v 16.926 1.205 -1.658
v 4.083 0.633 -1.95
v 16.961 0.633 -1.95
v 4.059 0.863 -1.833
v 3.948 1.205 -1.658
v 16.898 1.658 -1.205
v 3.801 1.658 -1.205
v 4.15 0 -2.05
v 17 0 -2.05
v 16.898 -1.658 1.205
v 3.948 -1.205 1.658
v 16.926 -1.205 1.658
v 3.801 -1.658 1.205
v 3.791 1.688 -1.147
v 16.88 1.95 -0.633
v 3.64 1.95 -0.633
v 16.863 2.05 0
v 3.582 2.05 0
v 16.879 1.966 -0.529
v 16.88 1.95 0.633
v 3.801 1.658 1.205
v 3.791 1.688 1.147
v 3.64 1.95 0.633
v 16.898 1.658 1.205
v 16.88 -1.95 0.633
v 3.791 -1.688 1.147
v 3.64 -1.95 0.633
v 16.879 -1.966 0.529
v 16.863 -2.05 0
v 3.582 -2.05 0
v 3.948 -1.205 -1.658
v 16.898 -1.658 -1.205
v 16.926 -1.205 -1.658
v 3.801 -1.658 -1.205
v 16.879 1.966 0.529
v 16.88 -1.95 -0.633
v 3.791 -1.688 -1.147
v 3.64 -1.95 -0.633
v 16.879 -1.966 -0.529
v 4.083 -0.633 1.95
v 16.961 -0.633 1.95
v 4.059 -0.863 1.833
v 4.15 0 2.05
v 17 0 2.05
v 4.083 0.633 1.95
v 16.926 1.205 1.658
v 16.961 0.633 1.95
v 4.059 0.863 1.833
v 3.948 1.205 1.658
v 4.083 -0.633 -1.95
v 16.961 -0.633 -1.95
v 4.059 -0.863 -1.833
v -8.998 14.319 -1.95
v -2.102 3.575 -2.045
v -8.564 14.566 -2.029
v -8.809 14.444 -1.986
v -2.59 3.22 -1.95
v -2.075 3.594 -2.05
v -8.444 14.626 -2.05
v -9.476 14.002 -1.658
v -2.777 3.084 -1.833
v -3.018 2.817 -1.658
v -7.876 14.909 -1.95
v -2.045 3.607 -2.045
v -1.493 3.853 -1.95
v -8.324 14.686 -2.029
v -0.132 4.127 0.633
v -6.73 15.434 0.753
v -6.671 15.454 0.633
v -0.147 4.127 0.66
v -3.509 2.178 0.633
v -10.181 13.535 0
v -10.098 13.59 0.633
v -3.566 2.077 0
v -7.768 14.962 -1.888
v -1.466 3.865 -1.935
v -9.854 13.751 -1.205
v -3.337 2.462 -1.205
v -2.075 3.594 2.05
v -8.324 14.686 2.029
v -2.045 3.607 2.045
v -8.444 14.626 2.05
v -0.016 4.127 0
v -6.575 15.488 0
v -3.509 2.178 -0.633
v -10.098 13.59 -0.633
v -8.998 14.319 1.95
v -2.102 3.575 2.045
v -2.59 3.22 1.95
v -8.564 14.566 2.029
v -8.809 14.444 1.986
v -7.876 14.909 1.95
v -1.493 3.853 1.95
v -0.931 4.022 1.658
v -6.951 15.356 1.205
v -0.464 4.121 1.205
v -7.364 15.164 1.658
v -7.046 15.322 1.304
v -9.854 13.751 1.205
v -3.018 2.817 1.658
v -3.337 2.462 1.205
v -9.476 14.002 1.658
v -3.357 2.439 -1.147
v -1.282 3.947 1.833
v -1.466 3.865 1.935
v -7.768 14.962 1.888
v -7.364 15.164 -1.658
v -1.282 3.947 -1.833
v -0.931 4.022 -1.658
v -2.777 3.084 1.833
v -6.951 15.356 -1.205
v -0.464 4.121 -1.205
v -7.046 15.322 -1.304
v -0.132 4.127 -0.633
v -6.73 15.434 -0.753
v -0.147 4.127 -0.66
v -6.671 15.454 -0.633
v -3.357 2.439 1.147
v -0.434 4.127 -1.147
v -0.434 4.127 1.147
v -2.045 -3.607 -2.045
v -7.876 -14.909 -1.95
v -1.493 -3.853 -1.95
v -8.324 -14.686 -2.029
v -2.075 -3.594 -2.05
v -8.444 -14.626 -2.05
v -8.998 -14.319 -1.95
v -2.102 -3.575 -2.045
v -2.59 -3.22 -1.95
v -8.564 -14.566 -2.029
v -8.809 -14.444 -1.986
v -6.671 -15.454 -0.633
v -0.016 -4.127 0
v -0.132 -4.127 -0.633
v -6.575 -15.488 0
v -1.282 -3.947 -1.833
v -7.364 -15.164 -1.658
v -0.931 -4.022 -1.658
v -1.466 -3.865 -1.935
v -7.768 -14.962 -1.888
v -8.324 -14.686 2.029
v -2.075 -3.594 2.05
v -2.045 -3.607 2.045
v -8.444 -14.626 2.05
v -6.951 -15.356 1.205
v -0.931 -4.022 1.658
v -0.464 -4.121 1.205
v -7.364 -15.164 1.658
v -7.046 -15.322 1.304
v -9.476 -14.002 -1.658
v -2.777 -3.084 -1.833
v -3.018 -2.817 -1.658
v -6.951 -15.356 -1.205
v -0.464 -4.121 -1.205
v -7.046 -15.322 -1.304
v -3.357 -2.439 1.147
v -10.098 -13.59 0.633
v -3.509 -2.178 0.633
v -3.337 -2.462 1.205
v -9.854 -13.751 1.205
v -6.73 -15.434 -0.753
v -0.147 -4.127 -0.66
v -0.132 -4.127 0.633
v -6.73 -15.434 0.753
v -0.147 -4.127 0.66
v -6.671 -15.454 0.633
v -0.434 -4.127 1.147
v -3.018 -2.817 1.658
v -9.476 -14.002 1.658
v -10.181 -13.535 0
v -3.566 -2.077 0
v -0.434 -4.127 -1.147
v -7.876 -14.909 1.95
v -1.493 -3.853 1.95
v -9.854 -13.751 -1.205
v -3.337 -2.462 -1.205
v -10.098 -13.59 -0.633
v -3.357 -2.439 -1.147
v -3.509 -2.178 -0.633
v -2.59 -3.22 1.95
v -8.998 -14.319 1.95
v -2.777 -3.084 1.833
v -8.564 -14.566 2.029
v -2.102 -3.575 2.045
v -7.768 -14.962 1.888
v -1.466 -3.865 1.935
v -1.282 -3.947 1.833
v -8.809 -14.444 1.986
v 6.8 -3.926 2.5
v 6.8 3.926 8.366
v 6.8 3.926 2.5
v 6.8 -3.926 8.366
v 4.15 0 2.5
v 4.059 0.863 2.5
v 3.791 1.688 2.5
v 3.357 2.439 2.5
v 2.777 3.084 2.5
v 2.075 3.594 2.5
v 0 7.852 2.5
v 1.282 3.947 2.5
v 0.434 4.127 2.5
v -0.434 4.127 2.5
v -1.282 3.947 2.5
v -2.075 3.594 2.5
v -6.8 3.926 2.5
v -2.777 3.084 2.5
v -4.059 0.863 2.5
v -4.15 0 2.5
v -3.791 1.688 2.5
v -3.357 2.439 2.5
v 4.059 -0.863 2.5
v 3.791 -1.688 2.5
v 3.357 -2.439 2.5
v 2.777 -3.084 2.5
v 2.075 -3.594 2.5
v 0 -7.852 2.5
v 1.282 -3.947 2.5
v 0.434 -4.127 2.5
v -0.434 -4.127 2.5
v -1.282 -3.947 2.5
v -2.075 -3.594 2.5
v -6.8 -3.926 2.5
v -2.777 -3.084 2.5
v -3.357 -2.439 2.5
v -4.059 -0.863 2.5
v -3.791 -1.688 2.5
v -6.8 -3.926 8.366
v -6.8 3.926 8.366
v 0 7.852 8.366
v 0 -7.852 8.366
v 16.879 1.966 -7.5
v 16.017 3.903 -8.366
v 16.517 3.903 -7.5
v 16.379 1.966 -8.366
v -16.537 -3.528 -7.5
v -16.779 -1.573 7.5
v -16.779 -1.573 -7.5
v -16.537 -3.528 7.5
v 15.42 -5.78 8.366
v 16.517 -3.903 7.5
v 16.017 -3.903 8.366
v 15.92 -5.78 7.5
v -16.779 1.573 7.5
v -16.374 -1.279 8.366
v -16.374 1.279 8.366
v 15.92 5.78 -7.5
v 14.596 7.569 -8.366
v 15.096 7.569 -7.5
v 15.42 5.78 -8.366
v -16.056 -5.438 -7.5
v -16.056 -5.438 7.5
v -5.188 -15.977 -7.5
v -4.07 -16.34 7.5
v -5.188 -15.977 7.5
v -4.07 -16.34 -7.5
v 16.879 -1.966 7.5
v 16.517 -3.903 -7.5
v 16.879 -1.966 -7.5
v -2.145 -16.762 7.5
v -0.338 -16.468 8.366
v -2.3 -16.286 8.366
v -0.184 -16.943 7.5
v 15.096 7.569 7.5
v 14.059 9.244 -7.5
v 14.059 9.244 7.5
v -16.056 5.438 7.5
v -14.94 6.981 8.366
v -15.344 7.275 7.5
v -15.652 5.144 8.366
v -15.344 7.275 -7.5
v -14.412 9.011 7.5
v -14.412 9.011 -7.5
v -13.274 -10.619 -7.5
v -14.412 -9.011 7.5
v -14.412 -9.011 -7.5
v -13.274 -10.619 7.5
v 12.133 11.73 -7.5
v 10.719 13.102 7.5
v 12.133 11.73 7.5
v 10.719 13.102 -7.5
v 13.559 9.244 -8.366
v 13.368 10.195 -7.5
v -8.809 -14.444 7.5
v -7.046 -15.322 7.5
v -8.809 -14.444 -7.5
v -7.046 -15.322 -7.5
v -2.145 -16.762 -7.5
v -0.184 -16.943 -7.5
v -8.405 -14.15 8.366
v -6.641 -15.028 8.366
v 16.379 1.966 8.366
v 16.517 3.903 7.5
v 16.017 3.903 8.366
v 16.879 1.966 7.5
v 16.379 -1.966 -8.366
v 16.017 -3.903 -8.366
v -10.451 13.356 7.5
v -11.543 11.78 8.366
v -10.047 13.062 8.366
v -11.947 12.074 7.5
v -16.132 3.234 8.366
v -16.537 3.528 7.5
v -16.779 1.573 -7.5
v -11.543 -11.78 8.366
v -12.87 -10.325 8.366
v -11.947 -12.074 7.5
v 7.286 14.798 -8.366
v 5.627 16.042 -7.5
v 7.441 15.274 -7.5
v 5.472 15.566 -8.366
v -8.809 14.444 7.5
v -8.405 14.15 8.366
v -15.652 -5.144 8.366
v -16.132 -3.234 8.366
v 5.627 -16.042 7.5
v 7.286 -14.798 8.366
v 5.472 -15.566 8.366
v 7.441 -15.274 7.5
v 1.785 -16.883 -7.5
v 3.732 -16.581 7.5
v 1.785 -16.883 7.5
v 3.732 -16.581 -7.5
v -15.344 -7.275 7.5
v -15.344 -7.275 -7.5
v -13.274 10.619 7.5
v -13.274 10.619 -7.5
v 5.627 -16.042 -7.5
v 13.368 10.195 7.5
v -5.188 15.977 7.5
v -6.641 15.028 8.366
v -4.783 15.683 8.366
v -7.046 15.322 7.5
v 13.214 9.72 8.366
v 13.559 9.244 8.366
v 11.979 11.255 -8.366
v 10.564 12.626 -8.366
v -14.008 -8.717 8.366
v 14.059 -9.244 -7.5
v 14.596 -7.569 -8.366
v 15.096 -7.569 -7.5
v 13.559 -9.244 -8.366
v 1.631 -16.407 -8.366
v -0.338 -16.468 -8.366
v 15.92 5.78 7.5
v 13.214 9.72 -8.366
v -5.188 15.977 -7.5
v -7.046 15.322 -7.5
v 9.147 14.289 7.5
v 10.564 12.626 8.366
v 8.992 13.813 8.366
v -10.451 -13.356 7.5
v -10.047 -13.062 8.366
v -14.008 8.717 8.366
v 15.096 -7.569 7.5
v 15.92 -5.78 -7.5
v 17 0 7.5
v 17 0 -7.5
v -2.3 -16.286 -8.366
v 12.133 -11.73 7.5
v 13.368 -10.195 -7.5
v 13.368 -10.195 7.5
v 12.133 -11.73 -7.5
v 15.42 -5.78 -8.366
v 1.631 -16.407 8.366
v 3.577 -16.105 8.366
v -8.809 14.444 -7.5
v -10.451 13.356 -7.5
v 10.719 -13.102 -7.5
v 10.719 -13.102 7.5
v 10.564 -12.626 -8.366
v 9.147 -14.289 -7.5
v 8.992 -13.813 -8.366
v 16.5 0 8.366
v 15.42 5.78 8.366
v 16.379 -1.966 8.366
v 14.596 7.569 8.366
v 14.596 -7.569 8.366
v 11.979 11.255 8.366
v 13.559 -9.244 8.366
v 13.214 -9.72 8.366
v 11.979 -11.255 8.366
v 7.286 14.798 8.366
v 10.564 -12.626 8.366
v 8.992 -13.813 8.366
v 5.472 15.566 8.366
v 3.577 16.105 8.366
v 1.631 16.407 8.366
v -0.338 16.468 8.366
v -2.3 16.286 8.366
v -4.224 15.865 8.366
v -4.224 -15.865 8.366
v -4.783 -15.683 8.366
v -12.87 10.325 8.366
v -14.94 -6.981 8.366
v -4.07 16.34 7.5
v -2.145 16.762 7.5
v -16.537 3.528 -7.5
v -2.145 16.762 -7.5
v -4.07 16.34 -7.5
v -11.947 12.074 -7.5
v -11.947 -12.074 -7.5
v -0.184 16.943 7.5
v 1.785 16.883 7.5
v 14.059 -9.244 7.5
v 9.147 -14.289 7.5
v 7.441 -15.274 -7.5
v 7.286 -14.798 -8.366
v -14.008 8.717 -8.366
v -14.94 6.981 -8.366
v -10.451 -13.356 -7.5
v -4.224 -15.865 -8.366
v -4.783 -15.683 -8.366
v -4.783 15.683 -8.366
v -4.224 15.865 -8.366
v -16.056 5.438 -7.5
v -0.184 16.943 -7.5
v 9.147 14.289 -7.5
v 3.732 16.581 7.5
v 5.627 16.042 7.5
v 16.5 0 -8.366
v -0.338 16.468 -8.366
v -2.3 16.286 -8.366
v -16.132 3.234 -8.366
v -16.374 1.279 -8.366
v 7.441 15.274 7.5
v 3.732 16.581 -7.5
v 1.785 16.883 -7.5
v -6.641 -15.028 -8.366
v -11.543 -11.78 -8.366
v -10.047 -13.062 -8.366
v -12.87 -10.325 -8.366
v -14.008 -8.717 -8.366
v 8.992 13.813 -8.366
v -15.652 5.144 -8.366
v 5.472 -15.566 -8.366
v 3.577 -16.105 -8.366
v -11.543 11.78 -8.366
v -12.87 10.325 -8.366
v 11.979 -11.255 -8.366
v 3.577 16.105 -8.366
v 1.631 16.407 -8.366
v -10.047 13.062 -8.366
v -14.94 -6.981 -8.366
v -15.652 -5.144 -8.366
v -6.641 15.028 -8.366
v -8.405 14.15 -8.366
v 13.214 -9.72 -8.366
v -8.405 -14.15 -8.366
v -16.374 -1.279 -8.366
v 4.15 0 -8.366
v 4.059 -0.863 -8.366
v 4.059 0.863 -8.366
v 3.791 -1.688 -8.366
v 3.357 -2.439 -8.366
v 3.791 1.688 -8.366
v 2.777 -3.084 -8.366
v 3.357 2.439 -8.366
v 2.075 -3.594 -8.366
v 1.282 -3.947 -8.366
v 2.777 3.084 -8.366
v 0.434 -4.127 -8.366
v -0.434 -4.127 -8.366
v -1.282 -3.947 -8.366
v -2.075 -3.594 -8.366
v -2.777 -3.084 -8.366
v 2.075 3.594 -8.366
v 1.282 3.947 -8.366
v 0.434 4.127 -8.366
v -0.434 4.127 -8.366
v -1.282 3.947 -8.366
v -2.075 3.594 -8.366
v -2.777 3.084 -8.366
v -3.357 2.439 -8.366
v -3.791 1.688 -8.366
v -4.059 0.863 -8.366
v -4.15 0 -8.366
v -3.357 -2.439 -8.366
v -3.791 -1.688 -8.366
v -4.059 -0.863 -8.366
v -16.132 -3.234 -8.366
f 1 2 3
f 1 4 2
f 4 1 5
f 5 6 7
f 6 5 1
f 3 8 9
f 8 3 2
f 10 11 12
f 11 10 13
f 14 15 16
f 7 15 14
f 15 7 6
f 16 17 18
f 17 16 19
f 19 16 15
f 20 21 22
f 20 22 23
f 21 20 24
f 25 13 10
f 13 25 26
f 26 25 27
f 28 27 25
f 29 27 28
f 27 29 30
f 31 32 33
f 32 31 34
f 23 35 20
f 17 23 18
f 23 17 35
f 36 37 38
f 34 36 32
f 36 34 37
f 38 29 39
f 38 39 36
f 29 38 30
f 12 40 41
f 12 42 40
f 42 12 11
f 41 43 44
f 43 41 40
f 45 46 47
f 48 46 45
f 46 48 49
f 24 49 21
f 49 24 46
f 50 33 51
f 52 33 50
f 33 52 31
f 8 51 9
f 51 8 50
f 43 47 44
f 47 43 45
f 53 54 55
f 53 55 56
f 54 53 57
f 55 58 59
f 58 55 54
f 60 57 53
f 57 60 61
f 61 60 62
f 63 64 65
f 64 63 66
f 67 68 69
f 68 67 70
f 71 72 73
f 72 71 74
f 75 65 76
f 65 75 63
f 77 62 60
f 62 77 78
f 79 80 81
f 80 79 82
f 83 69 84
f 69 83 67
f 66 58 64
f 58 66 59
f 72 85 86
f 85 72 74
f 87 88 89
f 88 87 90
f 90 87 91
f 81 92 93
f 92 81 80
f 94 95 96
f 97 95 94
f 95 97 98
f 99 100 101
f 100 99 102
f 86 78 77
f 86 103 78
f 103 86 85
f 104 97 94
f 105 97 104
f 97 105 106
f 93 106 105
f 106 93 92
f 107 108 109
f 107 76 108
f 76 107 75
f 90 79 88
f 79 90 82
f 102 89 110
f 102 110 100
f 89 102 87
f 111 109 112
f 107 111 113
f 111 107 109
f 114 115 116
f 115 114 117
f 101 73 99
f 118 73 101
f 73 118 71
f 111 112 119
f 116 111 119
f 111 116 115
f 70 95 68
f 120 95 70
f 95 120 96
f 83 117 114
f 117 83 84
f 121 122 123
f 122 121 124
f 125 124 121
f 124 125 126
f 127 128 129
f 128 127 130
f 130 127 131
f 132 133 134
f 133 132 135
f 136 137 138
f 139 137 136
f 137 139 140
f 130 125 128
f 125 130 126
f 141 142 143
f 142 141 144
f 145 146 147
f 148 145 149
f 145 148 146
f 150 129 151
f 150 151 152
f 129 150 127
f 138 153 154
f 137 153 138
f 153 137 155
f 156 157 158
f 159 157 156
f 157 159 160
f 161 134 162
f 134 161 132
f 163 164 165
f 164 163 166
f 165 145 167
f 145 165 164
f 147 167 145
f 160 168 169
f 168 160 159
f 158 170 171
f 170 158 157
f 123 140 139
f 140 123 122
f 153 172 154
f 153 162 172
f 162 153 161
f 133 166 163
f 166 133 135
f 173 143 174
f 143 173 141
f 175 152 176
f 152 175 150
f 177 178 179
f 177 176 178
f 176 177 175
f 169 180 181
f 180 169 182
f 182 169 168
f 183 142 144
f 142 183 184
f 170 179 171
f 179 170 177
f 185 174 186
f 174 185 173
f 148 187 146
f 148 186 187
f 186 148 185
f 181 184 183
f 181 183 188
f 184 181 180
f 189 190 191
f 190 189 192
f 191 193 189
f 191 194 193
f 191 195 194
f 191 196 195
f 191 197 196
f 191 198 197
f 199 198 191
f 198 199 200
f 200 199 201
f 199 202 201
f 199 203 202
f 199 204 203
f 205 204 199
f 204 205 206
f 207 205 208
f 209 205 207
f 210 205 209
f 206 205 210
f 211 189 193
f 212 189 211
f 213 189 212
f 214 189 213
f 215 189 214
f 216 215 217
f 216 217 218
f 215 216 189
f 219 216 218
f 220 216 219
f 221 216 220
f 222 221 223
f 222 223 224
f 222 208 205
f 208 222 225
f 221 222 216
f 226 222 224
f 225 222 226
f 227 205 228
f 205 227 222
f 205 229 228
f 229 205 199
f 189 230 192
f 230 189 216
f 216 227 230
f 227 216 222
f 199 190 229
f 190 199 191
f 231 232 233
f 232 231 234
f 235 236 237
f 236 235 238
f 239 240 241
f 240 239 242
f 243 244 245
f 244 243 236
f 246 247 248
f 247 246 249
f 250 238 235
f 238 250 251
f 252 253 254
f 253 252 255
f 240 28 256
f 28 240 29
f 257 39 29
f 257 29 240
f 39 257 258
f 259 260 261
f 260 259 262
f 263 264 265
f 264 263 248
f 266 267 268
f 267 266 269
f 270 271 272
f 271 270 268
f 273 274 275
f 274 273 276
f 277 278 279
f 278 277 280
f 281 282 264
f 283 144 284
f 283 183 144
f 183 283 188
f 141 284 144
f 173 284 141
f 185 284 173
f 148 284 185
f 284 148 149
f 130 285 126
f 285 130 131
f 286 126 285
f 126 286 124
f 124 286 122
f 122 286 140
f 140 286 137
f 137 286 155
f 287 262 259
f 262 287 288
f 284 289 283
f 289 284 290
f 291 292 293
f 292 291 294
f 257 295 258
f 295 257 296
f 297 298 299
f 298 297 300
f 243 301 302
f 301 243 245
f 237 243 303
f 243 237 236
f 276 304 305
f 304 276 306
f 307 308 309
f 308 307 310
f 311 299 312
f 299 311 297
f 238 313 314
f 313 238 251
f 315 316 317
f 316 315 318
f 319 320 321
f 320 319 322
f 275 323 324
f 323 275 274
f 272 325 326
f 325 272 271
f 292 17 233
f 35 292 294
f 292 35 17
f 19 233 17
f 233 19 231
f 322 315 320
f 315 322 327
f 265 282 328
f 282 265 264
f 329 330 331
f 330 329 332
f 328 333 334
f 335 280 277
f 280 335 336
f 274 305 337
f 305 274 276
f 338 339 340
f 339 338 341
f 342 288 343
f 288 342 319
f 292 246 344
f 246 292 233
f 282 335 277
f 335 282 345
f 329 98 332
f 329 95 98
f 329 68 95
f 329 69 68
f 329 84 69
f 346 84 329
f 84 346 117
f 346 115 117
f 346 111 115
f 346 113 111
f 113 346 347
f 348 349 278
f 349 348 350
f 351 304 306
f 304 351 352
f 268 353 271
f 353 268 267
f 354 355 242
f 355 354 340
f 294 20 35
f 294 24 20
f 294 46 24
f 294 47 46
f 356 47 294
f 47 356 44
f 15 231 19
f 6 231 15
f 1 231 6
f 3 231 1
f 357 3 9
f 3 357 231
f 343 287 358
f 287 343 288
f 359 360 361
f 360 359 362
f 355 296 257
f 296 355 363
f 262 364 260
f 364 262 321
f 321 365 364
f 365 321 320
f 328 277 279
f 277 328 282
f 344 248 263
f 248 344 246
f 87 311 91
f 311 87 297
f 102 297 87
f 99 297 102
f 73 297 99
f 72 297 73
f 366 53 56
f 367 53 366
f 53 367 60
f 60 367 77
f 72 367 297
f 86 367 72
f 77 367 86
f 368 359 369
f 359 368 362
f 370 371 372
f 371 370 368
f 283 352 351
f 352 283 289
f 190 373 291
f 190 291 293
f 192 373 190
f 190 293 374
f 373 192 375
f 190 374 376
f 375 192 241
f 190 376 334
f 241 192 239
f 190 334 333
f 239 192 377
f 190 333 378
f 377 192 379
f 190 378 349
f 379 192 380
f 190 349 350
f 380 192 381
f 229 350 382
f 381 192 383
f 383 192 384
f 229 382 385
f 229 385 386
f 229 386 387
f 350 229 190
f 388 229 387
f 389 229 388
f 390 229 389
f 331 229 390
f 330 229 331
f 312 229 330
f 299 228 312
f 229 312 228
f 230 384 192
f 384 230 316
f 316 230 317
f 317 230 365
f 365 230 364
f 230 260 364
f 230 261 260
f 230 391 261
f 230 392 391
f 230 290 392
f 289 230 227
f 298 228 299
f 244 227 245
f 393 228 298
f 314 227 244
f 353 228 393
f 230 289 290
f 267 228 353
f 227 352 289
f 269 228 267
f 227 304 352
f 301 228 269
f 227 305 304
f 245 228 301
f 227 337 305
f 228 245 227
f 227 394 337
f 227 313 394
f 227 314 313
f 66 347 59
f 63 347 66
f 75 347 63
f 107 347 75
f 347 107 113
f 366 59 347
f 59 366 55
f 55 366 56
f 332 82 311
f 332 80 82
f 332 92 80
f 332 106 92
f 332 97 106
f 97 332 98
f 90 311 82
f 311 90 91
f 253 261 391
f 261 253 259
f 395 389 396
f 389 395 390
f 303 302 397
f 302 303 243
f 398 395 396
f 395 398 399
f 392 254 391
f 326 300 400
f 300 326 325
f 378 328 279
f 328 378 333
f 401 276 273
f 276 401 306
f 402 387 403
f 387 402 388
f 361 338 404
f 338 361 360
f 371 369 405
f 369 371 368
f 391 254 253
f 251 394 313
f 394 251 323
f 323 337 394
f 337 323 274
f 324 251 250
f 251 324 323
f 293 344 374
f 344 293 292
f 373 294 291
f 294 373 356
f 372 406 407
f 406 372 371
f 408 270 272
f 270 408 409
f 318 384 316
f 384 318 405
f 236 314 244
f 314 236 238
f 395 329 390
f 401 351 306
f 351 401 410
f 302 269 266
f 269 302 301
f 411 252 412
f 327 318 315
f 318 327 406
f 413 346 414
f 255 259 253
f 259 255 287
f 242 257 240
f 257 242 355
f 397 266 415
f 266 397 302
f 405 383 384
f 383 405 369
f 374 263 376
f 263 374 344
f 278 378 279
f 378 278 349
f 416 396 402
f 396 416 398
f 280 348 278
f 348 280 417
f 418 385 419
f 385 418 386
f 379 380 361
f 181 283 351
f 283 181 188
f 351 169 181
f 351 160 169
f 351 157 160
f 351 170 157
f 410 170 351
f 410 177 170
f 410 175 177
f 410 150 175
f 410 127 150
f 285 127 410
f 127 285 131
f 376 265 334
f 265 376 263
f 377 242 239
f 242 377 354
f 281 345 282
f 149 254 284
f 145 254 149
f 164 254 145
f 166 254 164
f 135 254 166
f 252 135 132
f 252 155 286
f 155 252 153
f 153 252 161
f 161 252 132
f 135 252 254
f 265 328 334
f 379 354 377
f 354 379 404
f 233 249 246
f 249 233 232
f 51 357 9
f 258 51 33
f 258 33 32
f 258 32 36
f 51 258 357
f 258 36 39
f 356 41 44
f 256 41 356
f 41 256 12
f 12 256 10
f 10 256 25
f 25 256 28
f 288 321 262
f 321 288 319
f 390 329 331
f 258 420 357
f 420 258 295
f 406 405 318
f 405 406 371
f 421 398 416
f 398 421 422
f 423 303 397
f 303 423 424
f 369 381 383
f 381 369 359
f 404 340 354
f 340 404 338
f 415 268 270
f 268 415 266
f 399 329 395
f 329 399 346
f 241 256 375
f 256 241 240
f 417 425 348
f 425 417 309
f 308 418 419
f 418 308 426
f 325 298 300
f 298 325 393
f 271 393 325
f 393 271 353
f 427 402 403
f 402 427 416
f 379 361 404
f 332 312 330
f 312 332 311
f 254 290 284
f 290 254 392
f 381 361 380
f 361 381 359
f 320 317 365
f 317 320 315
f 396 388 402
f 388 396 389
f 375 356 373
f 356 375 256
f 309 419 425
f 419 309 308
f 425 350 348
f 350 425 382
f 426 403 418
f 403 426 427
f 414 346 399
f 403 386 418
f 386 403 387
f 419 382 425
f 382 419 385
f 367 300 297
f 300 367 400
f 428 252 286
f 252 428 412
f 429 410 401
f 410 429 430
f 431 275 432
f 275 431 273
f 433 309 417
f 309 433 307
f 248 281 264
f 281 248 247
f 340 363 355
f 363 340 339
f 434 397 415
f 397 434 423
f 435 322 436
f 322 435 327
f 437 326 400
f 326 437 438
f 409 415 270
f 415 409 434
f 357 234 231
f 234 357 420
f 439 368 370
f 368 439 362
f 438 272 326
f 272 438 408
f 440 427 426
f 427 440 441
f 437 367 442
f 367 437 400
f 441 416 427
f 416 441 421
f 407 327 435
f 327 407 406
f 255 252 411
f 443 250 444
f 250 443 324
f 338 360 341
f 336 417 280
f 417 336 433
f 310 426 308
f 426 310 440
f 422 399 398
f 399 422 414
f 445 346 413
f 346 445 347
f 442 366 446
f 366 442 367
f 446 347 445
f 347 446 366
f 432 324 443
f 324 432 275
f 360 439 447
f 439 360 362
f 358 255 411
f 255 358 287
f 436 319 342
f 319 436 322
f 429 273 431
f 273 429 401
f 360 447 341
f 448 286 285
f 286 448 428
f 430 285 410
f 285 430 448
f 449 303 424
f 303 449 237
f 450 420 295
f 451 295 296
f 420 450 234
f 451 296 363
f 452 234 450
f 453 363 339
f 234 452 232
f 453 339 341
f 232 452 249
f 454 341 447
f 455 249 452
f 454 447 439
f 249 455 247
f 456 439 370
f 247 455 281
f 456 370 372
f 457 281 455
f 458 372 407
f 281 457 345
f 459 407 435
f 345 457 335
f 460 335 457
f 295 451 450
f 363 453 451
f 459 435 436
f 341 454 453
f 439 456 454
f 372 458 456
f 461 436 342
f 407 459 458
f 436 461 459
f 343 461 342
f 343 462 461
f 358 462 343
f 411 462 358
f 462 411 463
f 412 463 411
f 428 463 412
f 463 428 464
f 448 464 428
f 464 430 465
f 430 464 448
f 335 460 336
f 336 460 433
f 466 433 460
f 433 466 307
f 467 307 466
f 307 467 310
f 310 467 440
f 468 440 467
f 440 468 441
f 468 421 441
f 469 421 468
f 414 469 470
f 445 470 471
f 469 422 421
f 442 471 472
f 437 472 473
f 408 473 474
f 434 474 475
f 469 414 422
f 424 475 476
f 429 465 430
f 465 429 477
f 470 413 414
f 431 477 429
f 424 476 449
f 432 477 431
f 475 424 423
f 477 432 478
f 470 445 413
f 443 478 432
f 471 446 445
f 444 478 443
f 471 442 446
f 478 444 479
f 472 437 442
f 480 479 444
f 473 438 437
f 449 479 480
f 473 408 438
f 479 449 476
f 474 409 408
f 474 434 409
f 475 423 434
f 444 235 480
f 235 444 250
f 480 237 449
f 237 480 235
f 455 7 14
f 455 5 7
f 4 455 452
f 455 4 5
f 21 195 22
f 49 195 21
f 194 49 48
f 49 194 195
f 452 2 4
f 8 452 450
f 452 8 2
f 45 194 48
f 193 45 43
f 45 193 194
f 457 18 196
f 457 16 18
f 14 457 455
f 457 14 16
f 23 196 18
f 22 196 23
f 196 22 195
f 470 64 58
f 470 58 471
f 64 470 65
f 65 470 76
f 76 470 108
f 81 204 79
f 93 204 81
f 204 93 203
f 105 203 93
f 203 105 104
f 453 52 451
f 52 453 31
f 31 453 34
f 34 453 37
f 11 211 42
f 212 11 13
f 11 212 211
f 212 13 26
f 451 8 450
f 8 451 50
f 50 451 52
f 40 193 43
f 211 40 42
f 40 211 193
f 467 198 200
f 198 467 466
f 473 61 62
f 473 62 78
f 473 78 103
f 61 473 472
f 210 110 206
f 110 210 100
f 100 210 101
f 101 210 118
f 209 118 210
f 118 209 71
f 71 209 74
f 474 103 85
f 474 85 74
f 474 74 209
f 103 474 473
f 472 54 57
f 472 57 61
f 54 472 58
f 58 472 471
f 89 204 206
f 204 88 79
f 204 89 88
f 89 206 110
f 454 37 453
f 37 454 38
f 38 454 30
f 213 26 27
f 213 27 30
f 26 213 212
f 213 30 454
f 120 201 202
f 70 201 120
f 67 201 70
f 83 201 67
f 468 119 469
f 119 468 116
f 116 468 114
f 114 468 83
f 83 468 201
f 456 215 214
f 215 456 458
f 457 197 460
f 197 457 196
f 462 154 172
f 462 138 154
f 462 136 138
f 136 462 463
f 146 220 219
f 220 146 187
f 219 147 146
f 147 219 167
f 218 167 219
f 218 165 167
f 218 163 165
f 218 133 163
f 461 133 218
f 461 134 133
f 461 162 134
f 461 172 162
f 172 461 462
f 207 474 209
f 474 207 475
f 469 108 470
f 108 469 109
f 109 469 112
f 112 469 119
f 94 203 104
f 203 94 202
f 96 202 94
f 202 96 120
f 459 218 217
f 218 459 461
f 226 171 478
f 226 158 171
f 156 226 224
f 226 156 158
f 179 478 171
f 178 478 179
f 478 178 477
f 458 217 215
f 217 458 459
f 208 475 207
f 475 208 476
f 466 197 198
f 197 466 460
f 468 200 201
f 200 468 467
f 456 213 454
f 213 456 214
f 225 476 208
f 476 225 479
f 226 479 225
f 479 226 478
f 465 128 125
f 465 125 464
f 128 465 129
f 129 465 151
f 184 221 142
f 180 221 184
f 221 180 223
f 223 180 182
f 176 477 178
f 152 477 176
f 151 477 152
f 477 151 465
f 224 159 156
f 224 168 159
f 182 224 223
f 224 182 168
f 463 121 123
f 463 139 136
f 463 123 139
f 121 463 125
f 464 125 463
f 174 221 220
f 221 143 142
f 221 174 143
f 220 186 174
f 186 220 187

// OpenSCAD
  


//build(3);   //Uncomment to build a view of all three complete blades. This is  only useful for getting an idea of the shape. Don't try to print this :)

//rotate([0,0,-70]) segment(1); //Uncomment to generate segment 1
//rotate([0,0,-30]) segment(2); //Uncomment to generate segment 2
//rotate([0,0,10]) segment(3);    //Uncomment to generate segment 3
th_mount();                //Uncomment to build the central mount for straight rod

/****PLUG & SOCKET SETTINGS****/
//You may need to tinker with these slightly to get a good push fit between the plug and socket pieces of the blade segments
shell_os = 1.7;         //Thickness of the blade skin
plug_os = 2.1;          //Difference between the blades outer skin & the plug
joiner_len = 40;        //Length of the plug


/****STRUT SETTINGS****/
//These may have to change too to suit whatever strut diameter you're using (or just leave them and drill it out to suit!)
strut_id = 4.1;     //internal diamter of the hole for the strut. On my printer this comes out about 0.5mm smaller than stated.
strut_od1 = 7;      //outer diamter of the cone shaped socket that the strut goes into
strut_od2 = 14;     //diamter of the other end of the cone shaped socket (inside the blade)
strut_depth = 8;    //you may need to adjust this with different blade settings if the penetration for the strut doesn't go right through the blade skin


/**** BLADE SETTINGS ****/
blade_cl = 150;         //distance from axle to blade centre-line
chord_len=40;           //chord length of the blade
piv = 0.295;            //scale factor to shift the blade forwards / backwards
blade_height = 440;     //total height of the blade
blade_rot = 120;        //angle of rotation of each blade
blade_slices = 100;    //number of vertical slices to built the blade. Use 100 for draft tinkering then 1000 to print (1000)
num_segs = 3;           //number of blade segments to print (3)
plug_base = 5;          //mm's of solid fill to go below the narrow plug.(5)
plug_len = 20;          //length of the plug between blade segments(20)
num_blades = 3;         //number of blades
end_os = 70;            //distance from top and bottom for strut sockets (70)
num_sockets = 3;        //number of strut sockets

/****MOUNT SETTINGS (STRAIGHT ROD)****/
st_mnt_big_r = 30;         //radius of the 'outer' cylinder
st_mnt_core = 8.4;         //diameter of the pentration for the central shaft.
st_mnt_depth = 10;         //thickness of the rim of the mount
st_mnt_screw = 3.4;        //diameter of the blockout for the screw-holes
st_mnt_screw_head = 7;     //diameter of the blockout for the screw-head
st_mnt_screw_head_depth = 3;   //depth of the blockout for the screw-head
st_mnt_height = 30;        //overall height of the mount
st_mnt_lil_r = 15;         //radius of the 'inner' cylinder
st_mnt_cross_hole = 3.4;   //diameter of the hole through the inner cylinder
st_mnt_nut_d = 6.1;        //width of nut to suit the hole through the inner cylinder




/*****MAIN SCRIPT*******/

NACA0024=[[1.0000,0.00252],[0.9500,0.01613],[0.9000,0.02896],[0.8000,0.05247],[0.7000,0.07328],[0.6000,0.09127],[0.5000,0.10588],[0.4000,0.11607],[0.3000,0.12004],[0.2500,0.11883],[0.2000,0.11475],[0.1500,0.10691],[0.1000,0.09365],[0.0750,0.08400],[0.0500,0.07109],[0.0250,0.05229],[0.0125,0.03788],[0.0000,0.00000],[0.0125,-0.03788],[0.0250,-0.05229],[0.0500,-0.07109],[0.0750,-0.08400],[0.1000,-0.09365],[0.1500,-0.10691],[0.2000,-0.11475],[0.2500,-0.11883],[0.3000,-0.12004],[0.4000,-0.11607],[0.5000,-0.10588],[0.6000,-0.09127],[0.7000,-0.07328],[0.8000,-0.05247],[0.9000,-0.02896],[0.9500,-0.01613],[1.0000,-0.00252]];

NACA0024_CORE=[[0.7000,0.07328],[0.6000,0.09127],[0.5000,0.10588],[0.4000,0.11607],[0.3000,0.12004],[0.2500,0.11883],[0.2000,0.11475],[0.1500,0.10691],[0.1000,0.09365],[0.0750,0.08400],[0.0500,0.07109],[0.0250,0.05229],[0.0125,0.03788],[0.0000,0.00000],[0.0125,-0.03788],[0.0250,-0.05229],[0.0500,-0.07109],[0.0750,-0.08400],[0.1000,-0.09365],[0.1500,-0.10691],[0.2000,-0.11475],[0.2500,-0.11883],[0.3000,-0.12004],[0.4000,-0.11607],[0.5000,-0.10588],[0.6000,-0.09127],[0.7000,-0.07328]];

socket_span = blade_height - 2 * end_os;                //distance between the two end sockets
socket_os = socket_span / (num_sockets - 1);            //distance between the socket centers
//strut_h = [end_os,blade_height/2,blade_height-end_os];
seg_len = blade_height / num_segs;                      //length of the foil segments for printing

module foil(){

    linear_extrude(height = blade_height, center = false, convexity = 10, twist = blade_rot, slices = blade_slices, scale = 1.0){ 
        translate([blade_cl,piv*chord_len,0]) rotate([0,0,-90]) polygon(points=chord_len*NACA0024);
        }
    for (j=[0:num_sockets-1]){
        strut_h = end_os + j * socket_os;
rotate([0,0,-360*strut_h/(blade_height*num_blades)]) translate([blade_cl-strut_depth,-chord_len/2+piv*chord_len,strut_h]) rotate([0,90,0]) cylinder(d1=strut_od1,d2=strut_od2, h=strut_depth, $fa=3);
        
    }
 }

module foil_core(core_os){
    linear_extrude(height = blade_height, center = false, convexity = 10, twist = blade_rot, slices = blade_slices, scale = 1.0){
        translate([blade_cl,piv*chord_len,0]) rotate([0,0,-90]) offset(r=-core_os){
            polygon(points=chord_len*NACA0024_CORE);
        }
    }
    for (j=[0:num_sockets-1]){
        strut_h = end_os + j * socket_os;
        rotate([0,0,-360*strut_h/(blade_height*num_blades)]) translate([blade_cl-2*strut_depth-0.1,-chord_len/2+piv*chord_len,strut_h]) rotate([0,90,0]) cylinder(d=strut_id,h=strut_depth*2,$fn=20);
    }
}


/* builds a set of 'num_blades' blades. Only really useful for looking at */
module build(){
    for(i=[0:num_blades-1]){
        rotate([0,0,i*(360/num_blades)]){
            for(j=[1:num_segs]){
                segment(j);
            }
        }
    }
    for(i=[0:num_sockets-1]){
        translate([0,0,end_os + i*socket_os]) build_mount(); //this needs to be rotated to suit the height
    }
}

/* module joiner no longer used in rev 03 */
module joiner(){
    difference(){
        foil();
        foil_core(shell_os);
        cylinder(r = 2*blade_cl,h=blade_height/2 - joiner_len/2);
        translate([0,0,blade_height/2+joiner_len/2]) cylinder(r=2*blade_cl,h=blade_height);
    }
}

/* module lower_blade no longer used in rev 03 */
module lower_blade(){
    difference(){
        foil();
        translate([0,0,blade_height/2-joiner_len/2]) cylinder(r=2*blade_cl,h=blade_height);
    }
    difference(){
        foil_core(plug_os);
        translate([0,0,blade_height/2-strut_id*0.75]) cylinder(r=2*blade_cl,h=blade_height);
    }
}

/* module top_blade no longer used in rev 03 */
module top_blade(){
    difference(){
        foil();
        cylinder(r=2*blade_cl,h=blade_height/2+joiner_len/2);
    }
    difference(){
        foil_core(plug_os);
       cylinder(r=2*blade_cl,h=blade_height/2+strut_id*0.75);
    }
}


/* module test_print no longer used in rev 03 */
module test_print(){
    translate([-50,150,-(blade_height/2-joiner_len/2-2)]) difference(){
        union(){
            translate([-100,0,0]) lower_blade();
            translate([-50,0,-2]) joiner();
            translate([-80,0,blade_height]) rotate([0,0,60]) rotate([0,180,0]) top_blade();
        }
        cylinder(r=2*1000,h=blade_height/2-joiner_len/2-2);
    }
}

module hollow_foil(){
    difference(){
        foil();
        foil_core(shell_os);
    }
}

/* builds a plug_end the in position to suit segment 'num' (starts at '1') */
module plug_end(pe_num){
    intersection(){
        foil();
        translate([0,0,pe_num*seg_len-plug_base]) cylinder(r=2*blade_cl,h=plug_base);
    }
    intersection(){
        foil_core(plug_os);
        translate([0,0,pe_num*seg_len-plug_base]) cylinder(r=2*blade_cl,h=plug_base+plug_len);
    }
}

/* prints the blade segment 'num' (starts at '1') */
module segment(num){
    intersection(){
        hollow_foil();
        translate([0,0,(num-1)*seg_len]) cylinder(r=2*blade_cl,h=seg_len);
    }
    if(num<num_segs){
        plug_end(num);
    } else{
        intersection(){
            foil();
            translate([0,0,blade_height-plug_base]) cylinder(r=2*blade_cl,h=seg_len);
        }
    }
    if(num==1){
        intersection(){
            foil();
            cylinder(r=2*blade_cl,h=shell_os);
        }
    }

            
}

        


module build_mount_straight_rod(){
    difference(){
        minkowski(){
            mount_core_str();
            sphere(r=1,$fa=20);
        }
        mount_blockout_str();
    }
}

module mount_core_str(){
    cylinder(r=st_mnt_big_r,h=st_mnt_depth-2,$fa=3, center=true);
    translate([0,0,-(st_mnt_depth-2)/2]) cylinder(r=st_mnt_lil_r,h=st_mnt_height-2,$fa=3);
}

module mount_blockout_str(){
    cylinder(d=st_mnt_core,h=st_mnt_height * 4,$fa=3,center=true); //shaft
        for(i=[0:num_blades-1]){
            rotate([0,90,i*360/num_blades]) cylinder(d=strut_id,h=4*st_mnt_big_r,$fn=20);
            rotate([0,0,i*360/num_blades+ 180/num_blades]) translate([st_mnt_lil_r+(st_mnt_big_r-st_mnt_lil_r)/2,0,0]) cylinder(d=st_mnt_screw,h=2*st_mnt_depth,$fn=20,center=true);  //screw hole
            rotate([0,0,i*360/num_blades+ 180/num_blades]) translate([st_mnt_lil_r+(st_mnt_big_r-st_mnt_lil_r)/2,0,st_mnt_depth-st_mnt_screw_head_depth]) cylinder(d=st_mnt_screw_head,h=st_mnt_depth,$fn=20,center=true);  //screw head
            translate([0,0,(st_mnt_height-st_mnt_depth)/2 + st_mnt_depth/2]) rotate([0,90,0]) cylinder(d=st_mnt_cross_hole,h=st_mnt_height*4,$fn=20,center=true);
            translate([st_mnt_lil_r-st_mnt_screw_head_depth/2,0,(st_mnt_height-st_mnt_depth)/2 + st_mnt_depth/2]) rotate([0,90,0]) cylinder(d=st_mnt_screw_head,h=st_mnt_screw_head_depth*2,$fn=20);
        }
        for(i=[0,120,240]){
            translate([-st_mnt_lil_r,0,(st_mnt_height-st_mnt_depth)/2 + st_mnt_depth/2]) rotate([i,0,0]) cube(size = [3,6*tan(30),6],center=true);
    }
}
    
//****MOUNT SETTINGS (THREADED ROD)****/
th_mnt_big_r = 20;
th_mnt_core = 8.3;
th_mnt_depth = 17;
th_mnt_nut_d = 13.6;
th_mnt_nut_h = 6;
th_chamfer_d = 2;

module th_mount(){
    difference(){
        minkowski(){
            cylinder(r=th_mnt_big_r-4, h=th_mnt_depth-2,$fa=2,center=true);
            sphere(d=th_chamfer_d,$fa=3);
        }
         for(i=[0:num_blades-1]){
            rotate([0,90,i*360/num_blades]) cylinder(d=strut_id,h=4*th_mnt_big_r,$fn=20);
         }
         for(i=[0,120,240]){
             translate([0,0,th_mnt_depth/2 - th_mnt_nut_h / 2]) rotate([0,0,i]) cube(size=[th_mnt_nut_d,th_mnt_nut_d*tan(30),th_mnt_nut_h],center=true);
         }
         cylinder(d=th_mnt_core,h=2*th_mnt_depth,$fn=30,center=true);
     }
 }
        
